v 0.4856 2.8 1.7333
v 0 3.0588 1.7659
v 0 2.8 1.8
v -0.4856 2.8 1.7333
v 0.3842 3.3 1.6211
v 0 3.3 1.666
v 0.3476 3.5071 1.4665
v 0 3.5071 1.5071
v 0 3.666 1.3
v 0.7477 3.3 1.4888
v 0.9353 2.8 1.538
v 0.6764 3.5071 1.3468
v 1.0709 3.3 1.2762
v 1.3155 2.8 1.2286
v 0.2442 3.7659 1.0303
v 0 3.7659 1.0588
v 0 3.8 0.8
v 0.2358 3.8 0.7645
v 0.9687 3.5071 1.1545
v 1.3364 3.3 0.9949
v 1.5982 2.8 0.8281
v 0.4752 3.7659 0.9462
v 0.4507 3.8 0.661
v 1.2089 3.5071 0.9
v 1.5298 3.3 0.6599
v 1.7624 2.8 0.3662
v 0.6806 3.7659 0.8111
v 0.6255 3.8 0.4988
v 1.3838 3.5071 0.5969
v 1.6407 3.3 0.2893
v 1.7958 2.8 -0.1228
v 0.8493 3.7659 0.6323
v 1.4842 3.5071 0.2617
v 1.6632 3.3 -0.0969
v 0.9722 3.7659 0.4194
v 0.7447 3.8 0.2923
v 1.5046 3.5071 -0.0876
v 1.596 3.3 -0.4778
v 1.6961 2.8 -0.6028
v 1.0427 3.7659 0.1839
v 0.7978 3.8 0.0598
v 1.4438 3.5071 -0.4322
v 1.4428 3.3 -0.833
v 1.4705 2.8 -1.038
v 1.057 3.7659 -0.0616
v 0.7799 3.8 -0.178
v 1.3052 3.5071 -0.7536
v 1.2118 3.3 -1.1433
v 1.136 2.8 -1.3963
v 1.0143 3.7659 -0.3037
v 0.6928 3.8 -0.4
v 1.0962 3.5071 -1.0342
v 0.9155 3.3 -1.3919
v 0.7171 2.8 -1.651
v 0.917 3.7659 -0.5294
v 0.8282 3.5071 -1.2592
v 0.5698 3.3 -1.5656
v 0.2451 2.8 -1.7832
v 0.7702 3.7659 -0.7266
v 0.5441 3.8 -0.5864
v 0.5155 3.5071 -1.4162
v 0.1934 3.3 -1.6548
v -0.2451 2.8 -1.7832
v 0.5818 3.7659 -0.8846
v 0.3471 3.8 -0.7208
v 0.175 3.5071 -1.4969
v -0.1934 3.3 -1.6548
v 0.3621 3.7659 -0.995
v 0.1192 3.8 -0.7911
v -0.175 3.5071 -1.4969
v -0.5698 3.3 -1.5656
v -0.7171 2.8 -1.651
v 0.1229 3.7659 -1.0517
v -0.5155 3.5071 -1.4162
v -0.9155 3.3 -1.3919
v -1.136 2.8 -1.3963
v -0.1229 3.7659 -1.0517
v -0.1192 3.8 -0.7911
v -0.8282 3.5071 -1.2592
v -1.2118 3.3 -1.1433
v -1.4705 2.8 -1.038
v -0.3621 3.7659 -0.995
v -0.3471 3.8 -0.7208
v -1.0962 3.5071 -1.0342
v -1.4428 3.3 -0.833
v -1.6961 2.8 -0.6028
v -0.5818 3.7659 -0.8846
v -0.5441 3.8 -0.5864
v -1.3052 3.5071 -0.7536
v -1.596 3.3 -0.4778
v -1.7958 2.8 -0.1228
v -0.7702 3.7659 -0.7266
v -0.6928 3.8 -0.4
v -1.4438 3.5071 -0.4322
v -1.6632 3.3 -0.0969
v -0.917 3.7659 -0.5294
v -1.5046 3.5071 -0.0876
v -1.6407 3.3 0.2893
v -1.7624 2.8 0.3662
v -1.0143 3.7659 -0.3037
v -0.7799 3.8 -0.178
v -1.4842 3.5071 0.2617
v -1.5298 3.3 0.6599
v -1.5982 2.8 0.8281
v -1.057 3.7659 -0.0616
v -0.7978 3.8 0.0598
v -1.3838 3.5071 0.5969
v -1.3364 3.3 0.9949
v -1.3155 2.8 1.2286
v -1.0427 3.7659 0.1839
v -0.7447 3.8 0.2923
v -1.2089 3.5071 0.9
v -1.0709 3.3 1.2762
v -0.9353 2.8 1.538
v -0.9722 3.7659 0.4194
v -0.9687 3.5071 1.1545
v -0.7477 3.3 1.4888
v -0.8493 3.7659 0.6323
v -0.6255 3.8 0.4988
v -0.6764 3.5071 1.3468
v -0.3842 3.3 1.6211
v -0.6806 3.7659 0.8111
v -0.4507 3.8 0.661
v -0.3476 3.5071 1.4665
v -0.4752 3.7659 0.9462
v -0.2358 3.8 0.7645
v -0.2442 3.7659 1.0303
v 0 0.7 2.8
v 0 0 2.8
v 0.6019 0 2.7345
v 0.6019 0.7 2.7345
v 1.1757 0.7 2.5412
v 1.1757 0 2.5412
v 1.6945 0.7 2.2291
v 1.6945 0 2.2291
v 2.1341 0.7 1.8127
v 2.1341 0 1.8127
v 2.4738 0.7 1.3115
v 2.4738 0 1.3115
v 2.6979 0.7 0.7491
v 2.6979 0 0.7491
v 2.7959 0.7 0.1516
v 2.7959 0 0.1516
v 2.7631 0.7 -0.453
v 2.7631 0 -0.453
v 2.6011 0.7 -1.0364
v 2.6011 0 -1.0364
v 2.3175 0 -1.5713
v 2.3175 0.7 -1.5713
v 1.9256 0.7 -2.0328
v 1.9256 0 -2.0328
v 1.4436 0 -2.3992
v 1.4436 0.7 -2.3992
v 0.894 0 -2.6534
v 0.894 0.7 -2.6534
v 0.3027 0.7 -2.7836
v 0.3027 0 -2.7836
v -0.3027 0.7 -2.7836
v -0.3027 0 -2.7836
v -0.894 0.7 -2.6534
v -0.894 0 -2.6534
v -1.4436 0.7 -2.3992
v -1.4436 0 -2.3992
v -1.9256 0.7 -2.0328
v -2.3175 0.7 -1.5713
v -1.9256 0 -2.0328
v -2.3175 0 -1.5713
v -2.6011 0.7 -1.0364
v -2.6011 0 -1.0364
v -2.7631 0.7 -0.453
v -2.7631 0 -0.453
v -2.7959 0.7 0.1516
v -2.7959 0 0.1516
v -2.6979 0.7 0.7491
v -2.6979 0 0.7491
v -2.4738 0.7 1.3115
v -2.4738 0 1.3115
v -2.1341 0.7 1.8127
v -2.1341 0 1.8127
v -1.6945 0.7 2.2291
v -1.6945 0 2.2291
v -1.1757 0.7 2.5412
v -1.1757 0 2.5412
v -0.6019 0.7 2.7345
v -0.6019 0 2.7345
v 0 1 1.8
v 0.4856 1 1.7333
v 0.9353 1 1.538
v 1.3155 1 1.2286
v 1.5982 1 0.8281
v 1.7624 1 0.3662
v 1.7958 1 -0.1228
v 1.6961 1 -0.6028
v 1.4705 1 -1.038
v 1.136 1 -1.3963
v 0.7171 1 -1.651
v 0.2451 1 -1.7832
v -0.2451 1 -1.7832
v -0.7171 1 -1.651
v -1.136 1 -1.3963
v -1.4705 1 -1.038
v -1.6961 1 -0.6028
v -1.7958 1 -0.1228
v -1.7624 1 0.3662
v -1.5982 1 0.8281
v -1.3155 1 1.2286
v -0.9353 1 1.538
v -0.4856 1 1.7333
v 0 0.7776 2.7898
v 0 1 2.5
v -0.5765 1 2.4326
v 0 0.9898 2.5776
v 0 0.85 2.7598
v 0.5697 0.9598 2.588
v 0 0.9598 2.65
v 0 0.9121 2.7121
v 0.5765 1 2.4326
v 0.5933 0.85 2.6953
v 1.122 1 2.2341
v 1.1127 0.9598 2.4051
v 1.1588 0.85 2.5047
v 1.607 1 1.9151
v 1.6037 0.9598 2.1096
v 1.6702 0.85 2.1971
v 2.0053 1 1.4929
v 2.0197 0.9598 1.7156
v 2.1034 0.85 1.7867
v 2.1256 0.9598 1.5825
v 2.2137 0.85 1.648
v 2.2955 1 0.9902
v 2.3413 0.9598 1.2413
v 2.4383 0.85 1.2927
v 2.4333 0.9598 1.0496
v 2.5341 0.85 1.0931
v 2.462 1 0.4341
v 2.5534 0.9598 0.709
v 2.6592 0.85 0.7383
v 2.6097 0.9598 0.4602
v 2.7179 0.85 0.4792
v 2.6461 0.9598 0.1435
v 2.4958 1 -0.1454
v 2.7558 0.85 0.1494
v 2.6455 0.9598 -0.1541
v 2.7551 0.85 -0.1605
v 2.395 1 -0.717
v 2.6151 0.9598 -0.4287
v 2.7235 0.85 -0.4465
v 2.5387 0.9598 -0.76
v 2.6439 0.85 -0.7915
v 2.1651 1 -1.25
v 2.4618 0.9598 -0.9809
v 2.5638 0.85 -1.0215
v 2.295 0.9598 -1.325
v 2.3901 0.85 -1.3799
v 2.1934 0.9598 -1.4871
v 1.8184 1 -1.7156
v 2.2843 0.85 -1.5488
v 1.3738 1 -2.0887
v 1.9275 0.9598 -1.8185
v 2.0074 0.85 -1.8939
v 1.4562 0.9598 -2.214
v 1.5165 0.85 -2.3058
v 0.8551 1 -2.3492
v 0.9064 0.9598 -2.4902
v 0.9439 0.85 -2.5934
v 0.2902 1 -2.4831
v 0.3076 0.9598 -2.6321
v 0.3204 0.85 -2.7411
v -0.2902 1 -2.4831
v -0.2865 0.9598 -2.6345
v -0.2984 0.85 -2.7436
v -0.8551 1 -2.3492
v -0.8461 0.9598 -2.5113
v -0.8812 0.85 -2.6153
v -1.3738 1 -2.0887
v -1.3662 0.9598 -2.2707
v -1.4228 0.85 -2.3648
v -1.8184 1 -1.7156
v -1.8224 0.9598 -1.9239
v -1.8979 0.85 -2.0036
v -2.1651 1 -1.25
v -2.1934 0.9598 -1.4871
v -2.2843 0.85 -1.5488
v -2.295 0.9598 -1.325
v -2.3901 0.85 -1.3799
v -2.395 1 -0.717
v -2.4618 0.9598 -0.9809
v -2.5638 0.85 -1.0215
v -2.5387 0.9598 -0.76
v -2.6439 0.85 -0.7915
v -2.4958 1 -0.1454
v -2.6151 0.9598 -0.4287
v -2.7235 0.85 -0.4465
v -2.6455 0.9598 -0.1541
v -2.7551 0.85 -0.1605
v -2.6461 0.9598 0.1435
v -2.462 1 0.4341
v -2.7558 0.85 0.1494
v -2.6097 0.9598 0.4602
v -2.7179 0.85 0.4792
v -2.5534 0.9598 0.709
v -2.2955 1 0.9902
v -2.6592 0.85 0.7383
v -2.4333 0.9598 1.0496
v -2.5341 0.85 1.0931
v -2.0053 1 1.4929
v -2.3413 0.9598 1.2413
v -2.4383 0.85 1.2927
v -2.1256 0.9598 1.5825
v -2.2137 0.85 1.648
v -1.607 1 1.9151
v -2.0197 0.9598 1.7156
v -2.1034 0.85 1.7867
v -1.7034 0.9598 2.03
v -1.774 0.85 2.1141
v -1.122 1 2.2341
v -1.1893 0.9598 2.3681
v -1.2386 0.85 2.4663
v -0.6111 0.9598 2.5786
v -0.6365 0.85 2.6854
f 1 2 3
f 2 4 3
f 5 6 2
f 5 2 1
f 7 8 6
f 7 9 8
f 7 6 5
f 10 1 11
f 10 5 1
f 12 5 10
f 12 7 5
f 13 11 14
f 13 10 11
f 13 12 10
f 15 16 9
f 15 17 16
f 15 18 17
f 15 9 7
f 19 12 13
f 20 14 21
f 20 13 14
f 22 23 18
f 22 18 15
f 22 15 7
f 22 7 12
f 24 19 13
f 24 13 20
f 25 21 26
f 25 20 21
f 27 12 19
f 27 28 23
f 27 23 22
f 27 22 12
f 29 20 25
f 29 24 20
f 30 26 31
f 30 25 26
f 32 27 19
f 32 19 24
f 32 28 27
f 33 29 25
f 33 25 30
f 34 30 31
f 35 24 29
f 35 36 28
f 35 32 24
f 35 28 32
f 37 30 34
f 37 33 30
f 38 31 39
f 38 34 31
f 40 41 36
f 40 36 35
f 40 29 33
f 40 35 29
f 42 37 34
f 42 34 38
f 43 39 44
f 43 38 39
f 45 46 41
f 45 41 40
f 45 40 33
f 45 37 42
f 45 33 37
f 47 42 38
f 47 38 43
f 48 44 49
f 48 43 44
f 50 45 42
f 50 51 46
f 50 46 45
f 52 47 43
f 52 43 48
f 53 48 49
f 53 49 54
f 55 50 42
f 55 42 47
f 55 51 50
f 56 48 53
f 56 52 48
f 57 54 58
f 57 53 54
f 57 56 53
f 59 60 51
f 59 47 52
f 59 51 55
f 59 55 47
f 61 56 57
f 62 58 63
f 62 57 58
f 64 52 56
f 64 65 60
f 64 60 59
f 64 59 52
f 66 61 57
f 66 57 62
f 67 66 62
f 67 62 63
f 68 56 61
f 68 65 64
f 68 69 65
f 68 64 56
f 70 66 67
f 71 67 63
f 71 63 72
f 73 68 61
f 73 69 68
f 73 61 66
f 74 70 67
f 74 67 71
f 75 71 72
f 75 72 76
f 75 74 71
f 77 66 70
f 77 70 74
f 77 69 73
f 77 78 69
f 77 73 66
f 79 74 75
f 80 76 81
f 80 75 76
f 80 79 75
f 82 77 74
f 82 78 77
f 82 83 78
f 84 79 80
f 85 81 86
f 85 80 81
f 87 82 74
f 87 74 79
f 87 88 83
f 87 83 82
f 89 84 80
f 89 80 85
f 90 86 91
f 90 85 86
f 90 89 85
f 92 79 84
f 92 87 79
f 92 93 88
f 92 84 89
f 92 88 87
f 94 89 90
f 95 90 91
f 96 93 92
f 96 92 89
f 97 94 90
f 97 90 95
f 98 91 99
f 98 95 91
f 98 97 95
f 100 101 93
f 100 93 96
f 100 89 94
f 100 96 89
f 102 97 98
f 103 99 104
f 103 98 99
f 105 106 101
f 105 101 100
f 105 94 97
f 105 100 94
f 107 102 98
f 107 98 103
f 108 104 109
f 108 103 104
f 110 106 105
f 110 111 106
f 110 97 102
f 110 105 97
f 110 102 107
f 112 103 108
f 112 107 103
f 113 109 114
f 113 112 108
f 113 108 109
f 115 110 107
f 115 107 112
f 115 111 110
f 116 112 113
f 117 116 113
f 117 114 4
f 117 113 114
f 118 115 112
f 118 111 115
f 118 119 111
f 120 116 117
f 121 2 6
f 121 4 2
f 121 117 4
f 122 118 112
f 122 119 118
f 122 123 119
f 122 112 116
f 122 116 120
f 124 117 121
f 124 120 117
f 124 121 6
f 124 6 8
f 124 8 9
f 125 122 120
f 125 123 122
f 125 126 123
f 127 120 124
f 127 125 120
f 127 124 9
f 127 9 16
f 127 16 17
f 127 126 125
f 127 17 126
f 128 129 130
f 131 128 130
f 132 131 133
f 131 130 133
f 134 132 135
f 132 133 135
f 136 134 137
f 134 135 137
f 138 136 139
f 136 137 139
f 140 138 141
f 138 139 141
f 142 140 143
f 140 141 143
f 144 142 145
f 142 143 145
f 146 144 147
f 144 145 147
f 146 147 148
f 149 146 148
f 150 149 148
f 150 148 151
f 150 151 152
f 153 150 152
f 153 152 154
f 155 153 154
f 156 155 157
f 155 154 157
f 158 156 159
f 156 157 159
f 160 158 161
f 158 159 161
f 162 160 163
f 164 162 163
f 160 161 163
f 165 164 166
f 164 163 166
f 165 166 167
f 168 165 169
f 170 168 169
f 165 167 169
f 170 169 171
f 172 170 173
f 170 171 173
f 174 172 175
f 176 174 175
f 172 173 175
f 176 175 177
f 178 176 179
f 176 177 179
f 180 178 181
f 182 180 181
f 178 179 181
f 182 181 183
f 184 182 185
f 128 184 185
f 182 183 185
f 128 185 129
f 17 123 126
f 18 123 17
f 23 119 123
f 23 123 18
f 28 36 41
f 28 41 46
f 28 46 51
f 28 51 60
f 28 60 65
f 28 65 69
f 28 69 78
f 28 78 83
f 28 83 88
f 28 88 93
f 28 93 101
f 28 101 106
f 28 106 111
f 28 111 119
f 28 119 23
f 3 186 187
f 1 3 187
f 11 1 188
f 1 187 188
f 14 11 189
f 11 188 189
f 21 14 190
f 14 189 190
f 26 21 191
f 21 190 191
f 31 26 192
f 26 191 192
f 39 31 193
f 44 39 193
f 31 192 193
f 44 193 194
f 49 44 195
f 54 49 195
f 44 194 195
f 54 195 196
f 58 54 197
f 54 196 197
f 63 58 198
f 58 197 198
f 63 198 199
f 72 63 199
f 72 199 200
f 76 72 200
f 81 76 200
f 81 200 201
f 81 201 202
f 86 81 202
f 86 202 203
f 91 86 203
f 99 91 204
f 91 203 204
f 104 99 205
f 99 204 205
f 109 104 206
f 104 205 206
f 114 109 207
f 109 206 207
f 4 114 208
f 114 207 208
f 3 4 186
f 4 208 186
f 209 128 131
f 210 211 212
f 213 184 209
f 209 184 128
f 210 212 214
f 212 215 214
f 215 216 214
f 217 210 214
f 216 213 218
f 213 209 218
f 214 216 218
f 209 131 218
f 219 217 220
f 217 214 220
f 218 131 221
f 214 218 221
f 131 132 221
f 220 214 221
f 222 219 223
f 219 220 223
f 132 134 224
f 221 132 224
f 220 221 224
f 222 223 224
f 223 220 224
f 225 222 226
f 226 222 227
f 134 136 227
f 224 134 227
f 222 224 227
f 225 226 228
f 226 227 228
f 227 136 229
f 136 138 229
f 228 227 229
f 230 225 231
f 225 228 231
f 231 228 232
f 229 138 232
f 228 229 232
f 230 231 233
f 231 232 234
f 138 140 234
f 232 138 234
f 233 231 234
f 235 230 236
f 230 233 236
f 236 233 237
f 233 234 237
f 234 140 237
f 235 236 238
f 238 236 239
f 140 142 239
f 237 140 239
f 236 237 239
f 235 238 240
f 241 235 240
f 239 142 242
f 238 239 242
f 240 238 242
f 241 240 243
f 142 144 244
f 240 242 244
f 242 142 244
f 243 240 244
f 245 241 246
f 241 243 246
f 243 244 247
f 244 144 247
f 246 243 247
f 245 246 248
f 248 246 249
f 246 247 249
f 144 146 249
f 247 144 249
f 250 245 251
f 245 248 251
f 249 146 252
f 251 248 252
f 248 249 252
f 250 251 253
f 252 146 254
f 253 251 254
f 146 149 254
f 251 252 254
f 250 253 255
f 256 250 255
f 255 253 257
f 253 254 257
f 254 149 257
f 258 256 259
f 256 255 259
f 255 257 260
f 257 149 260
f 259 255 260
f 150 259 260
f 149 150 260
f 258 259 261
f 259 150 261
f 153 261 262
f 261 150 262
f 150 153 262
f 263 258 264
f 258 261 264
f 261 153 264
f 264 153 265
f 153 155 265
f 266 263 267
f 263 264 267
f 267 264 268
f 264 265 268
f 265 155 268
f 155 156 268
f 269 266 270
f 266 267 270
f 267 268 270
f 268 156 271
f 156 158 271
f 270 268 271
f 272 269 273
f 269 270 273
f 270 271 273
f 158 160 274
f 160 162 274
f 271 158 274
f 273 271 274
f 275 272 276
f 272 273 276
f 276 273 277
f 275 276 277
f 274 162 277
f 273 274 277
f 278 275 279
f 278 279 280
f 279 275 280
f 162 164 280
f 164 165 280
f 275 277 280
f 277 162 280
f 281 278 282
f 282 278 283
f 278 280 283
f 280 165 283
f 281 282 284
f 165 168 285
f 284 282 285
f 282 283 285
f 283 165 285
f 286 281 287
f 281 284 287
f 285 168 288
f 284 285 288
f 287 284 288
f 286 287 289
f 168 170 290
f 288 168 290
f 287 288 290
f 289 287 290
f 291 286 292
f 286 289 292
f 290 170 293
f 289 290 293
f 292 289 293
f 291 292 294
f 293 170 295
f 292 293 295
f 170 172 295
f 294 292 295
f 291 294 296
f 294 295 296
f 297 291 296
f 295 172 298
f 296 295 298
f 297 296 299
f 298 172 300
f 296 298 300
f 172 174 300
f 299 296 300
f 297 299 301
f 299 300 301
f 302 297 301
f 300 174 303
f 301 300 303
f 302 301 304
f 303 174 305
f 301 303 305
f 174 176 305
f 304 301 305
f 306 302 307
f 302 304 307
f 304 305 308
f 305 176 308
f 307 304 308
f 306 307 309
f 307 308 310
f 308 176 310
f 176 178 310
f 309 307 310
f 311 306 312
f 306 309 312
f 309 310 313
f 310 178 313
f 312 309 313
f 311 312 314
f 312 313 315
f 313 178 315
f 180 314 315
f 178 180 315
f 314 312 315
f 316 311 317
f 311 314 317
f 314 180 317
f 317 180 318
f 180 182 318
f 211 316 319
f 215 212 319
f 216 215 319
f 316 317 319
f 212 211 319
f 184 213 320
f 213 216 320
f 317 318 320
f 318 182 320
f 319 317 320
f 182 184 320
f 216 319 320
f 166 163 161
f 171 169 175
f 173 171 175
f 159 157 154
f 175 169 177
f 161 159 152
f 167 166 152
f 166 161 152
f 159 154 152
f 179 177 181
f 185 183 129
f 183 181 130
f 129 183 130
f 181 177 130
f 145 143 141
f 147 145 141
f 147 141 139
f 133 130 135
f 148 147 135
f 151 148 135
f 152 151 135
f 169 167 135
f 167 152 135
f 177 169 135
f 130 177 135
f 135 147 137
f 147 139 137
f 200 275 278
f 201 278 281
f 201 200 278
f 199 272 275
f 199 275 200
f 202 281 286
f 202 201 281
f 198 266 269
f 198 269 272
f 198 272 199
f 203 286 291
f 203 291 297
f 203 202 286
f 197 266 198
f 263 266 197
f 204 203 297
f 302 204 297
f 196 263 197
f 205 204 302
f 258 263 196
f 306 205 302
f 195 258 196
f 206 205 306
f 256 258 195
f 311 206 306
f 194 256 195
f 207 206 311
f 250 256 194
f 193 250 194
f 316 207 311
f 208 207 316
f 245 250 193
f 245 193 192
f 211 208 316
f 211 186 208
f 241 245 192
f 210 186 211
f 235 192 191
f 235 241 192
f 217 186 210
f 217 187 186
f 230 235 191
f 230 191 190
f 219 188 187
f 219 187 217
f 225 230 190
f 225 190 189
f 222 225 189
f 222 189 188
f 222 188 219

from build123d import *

# Parameters (mm, degrees)
SKETCH_1_R      = 2.8
EXTRUDE_2_DEPTH = 1
SKETCH_2_R      = 1.8
EXTRUDE_3_DEPTH = 2.8
FILLET_1_R      = 1
FILLET_2_R      = 0.3


with BuildPart() as part:
    # 草图1 → 凸台-拉伸2 (new body)
    with BuildSketch(Plane(origin=(0, 0, 0), x_dir=(1, 0, 0), z_dir=(0, 1, 0))):
        with Locations(Location((0, 0, 0), (0, 0, 270))):
            Circle(SKETCH_1_R)
    extrude(amount=EXTRUDE_2_DEPTH)

    # 草图2 → 凸台-拉伸3 (add)
    with BuildSketch(Plane(origin=(0, 1, 0), x_dir=(1, 0, 0), z_dir=(0, 1, 0))):
        with Locations(Location((0, 0, 0), (0, 0, 270))):
            Circle(SKETCH_2_R)
    extrude(amount=EXTRUDE_3_DEPTH)

    # 圆角1
    fillet_1_edges = [part.edges().sort_by_distance(p)[0] for p in [
        (0, 3.8, -1.8),
    ]]
    fillet(fillet_1_edges, radius=FILLET_1_R)

    # 圆角2
    fillet_2_edges = [part.edges().sort_by_distance(p)[0] for p in [
        (0, 1, -2.8),
    ]]
    fillet(fillet_2_edges, radius=FILLET_2_R)


solid = part.part
